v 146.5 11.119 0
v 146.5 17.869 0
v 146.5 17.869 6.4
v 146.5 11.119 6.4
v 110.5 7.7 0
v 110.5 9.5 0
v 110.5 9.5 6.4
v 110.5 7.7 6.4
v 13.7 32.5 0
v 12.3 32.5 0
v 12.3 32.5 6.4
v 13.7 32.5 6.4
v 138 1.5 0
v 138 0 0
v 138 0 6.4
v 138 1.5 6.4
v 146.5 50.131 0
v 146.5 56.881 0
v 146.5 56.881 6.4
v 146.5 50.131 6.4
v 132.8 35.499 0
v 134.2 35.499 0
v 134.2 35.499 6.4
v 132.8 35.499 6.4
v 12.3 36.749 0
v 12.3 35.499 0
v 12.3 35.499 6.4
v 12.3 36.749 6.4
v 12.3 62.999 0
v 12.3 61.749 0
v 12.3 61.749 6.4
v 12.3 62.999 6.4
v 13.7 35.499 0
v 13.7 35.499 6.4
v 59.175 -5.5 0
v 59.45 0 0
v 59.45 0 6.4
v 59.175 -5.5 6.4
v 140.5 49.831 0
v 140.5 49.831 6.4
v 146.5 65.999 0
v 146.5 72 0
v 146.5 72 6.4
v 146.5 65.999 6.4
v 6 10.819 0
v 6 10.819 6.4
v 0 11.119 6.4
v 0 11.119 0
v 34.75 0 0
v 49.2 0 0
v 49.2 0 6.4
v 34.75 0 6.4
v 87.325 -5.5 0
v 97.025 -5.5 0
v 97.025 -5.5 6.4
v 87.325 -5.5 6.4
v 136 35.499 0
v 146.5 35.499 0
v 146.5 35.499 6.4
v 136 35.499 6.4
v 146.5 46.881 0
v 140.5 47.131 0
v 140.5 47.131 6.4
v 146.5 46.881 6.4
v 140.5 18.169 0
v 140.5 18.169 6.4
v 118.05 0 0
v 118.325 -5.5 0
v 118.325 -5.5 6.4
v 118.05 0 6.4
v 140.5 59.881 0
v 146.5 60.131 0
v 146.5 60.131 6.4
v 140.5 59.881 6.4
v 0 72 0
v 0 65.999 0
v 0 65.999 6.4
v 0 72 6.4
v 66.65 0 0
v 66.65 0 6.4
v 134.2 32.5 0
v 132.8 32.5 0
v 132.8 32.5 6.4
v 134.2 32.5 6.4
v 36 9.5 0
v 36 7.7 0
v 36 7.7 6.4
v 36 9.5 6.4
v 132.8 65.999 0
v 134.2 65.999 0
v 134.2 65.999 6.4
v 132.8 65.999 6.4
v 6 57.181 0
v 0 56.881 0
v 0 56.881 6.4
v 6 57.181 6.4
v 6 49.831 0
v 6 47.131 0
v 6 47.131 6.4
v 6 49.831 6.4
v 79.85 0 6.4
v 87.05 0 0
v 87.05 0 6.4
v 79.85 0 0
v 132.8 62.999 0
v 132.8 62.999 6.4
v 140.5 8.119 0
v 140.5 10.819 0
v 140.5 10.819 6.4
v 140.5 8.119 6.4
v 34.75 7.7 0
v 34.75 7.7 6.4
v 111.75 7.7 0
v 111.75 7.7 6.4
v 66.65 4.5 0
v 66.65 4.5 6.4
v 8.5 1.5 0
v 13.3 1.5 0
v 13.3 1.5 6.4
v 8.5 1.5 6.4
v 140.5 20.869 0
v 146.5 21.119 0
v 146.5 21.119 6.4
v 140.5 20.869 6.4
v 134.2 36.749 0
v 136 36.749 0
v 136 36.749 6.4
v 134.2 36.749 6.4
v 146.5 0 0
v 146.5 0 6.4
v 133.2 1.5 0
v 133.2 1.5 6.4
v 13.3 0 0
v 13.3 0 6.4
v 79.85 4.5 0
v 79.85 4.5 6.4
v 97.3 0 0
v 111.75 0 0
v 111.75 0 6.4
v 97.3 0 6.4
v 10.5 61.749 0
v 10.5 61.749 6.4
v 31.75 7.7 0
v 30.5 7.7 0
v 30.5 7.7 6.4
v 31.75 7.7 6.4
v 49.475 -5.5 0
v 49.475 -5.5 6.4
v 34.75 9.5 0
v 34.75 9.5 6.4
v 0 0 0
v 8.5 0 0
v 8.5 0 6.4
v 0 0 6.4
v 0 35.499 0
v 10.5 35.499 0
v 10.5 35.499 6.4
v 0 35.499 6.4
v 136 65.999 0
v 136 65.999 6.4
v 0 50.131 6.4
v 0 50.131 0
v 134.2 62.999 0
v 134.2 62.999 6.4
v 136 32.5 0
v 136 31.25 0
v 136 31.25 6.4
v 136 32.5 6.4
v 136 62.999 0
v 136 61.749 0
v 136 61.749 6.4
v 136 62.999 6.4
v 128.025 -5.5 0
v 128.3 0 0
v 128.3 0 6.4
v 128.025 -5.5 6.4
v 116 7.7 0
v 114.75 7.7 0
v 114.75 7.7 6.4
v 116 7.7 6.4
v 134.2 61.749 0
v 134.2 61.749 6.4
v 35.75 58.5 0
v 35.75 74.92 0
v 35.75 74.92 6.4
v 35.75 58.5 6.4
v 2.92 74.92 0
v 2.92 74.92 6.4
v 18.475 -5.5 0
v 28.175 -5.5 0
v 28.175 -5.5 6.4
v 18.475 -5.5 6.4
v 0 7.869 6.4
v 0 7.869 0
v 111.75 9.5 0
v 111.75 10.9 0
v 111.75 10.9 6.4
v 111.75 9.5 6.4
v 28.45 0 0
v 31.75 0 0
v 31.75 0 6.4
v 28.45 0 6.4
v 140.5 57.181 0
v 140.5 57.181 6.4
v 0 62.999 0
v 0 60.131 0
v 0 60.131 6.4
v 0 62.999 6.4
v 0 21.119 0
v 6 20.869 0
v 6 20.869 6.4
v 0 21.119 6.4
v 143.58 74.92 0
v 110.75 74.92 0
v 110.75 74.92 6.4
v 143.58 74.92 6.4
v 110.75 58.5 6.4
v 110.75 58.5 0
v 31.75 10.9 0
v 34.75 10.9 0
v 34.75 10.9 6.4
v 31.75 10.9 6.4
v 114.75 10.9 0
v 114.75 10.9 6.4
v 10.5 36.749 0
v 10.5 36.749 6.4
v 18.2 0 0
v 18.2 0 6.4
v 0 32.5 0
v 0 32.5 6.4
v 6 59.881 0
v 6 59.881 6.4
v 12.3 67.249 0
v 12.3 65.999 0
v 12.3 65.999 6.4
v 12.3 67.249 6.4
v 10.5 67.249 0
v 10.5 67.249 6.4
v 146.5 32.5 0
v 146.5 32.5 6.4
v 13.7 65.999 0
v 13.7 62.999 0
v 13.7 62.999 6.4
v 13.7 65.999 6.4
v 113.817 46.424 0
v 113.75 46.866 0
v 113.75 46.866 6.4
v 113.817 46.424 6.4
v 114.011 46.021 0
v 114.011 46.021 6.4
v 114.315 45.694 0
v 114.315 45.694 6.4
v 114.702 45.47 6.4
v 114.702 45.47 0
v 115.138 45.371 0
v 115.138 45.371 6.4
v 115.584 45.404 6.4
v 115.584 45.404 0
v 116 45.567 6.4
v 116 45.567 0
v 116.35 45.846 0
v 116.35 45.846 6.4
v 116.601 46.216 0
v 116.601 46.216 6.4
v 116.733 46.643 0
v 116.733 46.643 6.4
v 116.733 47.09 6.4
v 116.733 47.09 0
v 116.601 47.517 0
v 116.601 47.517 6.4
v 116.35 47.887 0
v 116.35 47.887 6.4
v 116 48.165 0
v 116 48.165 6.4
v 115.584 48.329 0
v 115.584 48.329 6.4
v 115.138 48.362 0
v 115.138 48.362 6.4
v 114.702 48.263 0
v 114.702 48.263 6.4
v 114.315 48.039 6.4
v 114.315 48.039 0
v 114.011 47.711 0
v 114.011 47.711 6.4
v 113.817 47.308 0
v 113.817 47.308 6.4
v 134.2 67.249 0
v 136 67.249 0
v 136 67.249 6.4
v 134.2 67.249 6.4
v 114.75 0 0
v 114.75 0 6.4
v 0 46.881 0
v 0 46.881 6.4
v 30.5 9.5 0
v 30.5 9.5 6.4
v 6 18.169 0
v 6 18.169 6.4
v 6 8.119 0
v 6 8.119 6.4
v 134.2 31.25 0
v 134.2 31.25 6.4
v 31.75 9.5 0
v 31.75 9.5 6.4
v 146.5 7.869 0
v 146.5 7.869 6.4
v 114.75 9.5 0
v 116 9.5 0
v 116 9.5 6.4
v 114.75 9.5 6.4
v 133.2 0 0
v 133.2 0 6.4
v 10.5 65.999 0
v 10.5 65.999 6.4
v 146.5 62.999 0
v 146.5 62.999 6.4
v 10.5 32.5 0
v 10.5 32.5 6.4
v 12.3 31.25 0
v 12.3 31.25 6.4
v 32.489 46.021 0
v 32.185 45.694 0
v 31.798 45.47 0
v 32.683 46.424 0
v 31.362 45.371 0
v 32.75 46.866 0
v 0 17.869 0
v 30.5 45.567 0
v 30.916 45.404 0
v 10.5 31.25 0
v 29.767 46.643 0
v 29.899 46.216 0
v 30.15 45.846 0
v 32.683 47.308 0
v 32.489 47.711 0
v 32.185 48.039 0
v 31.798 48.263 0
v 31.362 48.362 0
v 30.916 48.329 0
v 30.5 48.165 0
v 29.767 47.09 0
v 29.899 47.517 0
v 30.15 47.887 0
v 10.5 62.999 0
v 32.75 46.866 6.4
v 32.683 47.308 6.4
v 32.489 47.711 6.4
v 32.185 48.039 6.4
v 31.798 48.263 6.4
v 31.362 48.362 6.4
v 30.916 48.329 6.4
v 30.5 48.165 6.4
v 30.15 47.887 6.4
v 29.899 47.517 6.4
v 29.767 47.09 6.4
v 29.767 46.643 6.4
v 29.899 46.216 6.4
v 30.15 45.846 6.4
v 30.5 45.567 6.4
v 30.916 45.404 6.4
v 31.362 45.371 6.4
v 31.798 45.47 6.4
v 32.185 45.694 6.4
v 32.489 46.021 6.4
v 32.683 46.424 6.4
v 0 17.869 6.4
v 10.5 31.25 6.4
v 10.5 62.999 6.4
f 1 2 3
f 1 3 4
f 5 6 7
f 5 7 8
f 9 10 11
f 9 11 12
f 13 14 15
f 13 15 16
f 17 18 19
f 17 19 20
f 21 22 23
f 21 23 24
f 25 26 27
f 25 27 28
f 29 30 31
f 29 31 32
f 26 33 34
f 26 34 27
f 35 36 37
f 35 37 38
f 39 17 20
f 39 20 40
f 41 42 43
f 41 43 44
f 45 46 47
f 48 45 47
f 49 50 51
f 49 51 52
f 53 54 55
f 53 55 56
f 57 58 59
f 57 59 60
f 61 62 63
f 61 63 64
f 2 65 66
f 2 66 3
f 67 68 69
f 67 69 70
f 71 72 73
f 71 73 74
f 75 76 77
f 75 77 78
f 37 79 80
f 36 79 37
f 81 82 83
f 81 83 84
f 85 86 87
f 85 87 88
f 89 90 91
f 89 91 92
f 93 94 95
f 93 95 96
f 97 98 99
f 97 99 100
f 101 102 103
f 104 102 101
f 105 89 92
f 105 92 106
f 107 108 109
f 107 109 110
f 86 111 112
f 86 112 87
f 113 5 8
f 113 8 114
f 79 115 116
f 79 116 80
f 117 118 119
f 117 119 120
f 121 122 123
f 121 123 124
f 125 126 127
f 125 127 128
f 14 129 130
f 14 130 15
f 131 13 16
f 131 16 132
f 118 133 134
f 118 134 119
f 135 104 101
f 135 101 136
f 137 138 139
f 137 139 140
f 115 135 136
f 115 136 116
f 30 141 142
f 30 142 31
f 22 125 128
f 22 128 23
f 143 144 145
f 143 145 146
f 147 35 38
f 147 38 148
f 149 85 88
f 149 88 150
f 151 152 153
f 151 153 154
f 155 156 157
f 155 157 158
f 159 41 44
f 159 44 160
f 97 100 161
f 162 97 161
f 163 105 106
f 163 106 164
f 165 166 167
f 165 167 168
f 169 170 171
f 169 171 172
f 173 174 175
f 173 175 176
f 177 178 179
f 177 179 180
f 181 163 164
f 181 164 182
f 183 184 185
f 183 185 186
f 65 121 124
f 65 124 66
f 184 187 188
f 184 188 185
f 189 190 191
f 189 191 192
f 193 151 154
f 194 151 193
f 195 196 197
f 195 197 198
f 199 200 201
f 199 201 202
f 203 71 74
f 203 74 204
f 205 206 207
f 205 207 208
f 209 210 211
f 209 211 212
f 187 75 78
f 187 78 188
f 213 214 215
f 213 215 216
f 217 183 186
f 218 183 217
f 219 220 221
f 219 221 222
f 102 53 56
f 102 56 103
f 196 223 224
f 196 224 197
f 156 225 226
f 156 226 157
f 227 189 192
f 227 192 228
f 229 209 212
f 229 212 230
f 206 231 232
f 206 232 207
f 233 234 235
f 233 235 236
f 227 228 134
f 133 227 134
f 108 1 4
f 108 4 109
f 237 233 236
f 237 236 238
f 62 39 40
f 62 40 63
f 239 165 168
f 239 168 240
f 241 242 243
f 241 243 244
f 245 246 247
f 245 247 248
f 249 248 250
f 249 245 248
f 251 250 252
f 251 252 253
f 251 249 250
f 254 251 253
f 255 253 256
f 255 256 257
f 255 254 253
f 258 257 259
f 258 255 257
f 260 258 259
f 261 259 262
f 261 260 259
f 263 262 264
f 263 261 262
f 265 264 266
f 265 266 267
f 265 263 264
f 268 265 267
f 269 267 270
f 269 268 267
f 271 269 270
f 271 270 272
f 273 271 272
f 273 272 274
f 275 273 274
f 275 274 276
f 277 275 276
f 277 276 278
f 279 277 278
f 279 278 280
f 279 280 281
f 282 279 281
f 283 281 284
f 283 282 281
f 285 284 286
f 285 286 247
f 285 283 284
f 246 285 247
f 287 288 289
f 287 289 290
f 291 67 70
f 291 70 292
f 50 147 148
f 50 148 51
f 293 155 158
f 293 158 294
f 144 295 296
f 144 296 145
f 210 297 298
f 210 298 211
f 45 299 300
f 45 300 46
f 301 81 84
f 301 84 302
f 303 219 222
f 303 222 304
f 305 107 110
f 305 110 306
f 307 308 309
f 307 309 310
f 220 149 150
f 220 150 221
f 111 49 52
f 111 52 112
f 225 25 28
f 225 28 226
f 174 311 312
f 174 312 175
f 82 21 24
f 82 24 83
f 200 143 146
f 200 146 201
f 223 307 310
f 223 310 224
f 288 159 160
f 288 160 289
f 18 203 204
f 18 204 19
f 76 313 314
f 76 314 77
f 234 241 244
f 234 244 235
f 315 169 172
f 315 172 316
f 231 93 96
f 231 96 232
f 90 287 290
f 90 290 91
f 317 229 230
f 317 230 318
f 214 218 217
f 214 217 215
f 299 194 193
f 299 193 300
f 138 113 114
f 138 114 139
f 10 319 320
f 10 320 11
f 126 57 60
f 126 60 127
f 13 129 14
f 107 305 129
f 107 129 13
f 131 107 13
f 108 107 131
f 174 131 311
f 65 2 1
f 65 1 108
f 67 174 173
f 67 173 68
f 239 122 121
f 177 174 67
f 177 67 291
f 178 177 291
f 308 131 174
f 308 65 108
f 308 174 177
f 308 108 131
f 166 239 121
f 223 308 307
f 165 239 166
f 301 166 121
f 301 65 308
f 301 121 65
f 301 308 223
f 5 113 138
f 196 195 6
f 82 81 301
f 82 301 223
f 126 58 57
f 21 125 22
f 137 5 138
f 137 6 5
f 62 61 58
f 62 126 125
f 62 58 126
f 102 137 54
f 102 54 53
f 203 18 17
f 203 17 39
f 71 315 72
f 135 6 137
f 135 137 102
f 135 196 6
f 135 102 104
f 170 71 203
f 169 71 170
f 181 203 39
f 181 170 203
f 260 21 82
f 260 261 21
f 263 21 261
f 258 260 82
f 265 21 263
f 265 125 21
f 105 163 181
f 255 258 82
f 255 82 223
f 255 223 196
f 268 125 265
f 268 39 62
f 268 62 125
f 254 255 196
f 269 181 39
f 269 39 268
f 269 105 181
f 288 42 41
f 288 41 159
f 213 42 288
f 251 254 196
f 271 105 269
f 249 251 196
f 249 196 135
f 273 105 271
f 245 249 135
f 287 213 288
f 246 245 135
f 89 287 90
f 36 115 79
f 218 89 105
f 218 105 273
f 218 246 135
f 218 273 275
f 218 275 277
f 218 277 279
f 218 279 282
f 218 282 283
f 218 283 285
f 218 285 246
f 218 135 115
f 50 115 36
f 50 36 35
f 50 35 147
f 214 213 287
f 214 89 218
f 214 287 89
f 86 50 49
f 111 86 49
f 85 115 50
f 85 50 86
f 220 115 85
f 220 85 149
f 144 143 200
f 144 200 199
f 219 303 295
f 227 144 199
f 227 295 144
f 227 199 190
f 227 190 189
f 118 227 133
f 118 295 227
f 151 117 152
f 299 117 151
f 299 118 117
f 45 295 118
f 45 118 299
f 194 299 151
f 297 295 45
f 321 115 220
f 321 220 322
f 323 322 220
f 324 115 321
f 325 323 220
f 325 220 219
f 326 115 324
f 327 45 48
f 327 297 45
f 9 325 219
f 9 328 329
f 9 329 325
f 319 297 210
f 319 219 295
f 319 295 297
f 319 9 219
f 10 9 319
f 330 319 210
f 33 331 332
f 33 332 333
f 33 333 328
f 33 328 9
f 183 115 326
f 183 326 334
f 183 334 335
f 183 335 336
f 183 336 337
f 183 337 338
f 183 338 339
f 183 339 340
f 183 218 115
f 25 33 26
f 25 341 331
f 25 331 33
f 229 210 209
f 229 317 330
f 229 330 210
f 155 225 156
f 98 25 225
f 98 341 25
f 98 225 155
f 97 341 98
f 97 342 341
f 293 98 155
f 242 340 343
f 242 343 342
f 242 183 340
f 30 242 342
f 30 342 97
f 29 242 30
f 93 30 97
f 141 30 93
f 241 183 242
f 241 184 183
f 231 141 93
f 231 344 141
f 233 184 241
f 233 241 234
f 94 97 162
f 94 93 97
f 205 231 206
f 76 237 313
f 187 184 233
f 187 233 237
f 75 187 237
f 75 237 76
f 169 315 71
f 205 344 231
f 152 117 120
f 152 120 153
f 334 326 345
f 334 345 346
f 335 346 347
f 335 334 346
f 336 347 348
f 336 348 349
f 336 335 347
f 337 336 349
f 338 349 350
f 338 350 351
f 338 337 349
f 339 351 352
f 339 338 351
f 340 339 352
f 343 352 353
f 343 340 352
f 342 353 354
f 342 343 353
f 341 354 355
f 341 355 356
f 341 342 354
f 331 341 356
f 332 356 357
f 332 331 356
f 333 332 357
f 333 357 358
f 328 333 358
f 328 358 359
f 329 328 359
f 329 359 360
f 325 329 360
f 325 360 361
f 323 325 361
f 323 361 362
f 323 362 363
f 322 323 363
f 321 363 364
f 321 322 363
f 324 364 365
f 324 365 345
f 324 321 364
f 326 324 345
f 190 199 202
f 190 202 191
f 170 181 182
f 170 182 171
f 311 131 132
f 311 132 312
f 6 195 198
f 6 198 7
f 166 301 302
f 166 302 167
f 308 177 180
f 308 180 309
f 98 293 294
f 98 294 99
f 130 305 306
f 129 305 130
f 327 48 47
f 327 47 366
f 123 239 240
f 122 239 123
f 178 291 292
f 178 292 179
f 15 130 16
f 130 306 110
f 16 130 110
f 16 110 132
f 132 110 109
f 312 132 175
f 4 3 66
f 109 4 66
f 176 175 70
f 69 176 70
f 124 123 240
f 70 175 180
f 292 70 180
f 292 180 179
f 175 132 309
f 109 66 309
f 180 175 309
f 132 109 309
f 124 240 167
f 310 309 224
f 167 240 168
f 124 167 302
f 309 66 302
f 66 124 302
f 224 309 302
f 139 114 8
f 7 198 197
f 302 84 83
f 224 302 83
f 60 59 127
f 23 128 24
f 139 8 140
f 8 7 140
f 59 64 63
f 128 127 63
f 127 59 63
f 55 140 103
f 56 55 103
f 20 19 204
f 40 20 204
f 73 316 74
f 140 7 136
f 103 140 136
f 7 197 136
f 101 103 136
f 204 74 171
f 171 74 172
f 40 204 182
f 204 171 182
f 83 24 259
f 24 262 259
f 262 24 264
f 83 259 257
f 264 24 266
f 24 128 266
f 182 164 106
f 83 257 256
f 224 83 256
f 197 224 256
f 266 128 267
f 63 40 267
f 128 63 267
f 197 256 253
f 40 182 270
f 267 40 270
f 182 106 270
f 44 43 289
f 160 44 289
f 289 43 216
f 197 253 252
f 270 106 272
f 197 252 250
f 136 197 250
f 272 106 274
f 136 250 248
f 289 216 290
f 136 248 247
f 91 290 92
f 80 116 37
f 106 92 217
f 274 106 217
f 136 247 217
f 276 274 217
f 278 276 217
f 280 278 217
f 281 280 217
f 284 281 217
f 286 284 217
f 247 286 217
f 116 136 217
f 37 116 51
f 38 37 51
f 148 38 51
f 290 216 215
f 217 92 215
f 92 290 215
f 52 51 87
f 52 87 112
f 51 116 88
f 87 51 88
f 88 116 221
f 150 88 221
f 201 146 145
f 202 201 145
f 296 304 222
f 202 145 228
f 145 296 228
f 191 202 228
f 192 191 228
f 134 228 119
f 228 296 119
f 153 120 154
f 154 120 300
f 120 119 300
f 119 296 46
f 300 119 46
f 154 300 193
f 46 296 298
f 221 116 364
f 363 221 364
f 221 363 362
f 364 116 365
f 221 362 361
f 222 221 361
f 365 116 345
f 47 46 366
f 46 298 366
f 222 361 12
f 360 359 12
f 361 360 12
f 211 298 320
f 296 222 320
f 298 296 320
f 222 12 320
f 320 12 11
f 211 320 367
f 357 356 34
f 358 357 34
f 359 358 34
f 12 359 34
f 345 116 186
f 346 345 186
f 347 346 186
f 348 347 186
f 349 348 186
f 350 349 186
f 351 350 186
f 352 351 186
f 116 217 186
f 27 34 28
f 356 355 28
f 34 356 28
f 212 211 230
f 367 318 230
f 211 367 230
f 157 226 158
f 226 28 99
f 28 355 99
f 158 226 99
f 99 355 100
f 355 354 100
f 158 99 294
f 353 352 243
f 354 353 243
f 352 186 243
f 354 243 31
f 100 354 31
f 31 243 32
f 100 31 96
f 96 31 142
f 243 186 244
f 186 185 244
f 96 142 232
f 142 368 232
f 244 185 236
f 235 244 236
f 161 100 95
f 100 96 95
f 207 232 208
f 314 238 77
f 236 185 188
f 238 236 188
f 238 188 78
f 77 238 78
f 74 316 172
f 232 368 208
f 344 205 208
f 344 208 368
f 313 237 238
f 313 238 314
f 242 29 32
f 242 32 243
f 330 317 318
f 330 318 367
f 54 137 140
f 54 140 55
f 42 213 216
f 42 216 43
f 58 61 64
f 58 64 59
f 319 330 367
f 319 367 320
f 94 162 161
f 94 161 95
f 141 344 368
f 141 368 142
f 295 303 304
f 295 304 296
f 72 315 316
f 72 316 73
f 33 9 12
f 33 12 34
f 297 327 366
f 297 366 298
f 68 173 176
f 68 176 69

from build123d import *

# Parameters (mm, degrees)
SKETCH2_R           = 1.5
BOSS_EXTRUDE1_DEPTH = 6.4


with BuildPart() as part:
    # Sketch2 → Boss-Extrude1 (new body)
    with BuildSketch(Plane.XY):
        Polygon((35.75, 58.5), (110.75, 58.5), (110.75, 74.92), (143.58, 74.92), (146.5, 72), (146.5, 65.999038761), (136, 65.999038761), (136, 67.249038761), (134.2, 67.249038761), (134.2, 65.999038761), (132.8, 65.999038761), (132.8, 62.999320414), (134.2, 62.999320414), (134.2, 61.749320414), (136, 61.749320414), (136, 62.999320414), (146.5, 62.999320414), (146.5, 60.13073157), (140.5, 59.88073157), (140.5, 57.18073157), (146.5, 56.88073157), (146.5, 50.13073157), (140.5, 49.83073157), (140.5, 47.13073157), (146.5, 46.88073157), (146.5, 35.499320414), (136, 35.499320414), (136, 36.749320414), (134.2, 36.749320414), (134.2, 35.499320414), (132.8, 35.499320414), (132.8, 32.499602067), (134.2, 32.499602067), (134.2, 31.249602067), (136, 31.249602067), (136, 32.499602067), (146.5, 32.499602067), (146.5, 21.11926843), (140.5, 20.86926843), (140.5, 18.16926843), (146.5, 17.86926843), (146.5, 11.11926843), (140.5, 10.81926843), (140.5, 8.11926843), (146.5, 7.86926843), (146.5, 0), (138, 0), (138, 1.5), (133.2, 1.5), (133.2, 0), (128.3, 0), (128.025, -5.5), (118.325, -5.5), (118.05, 0), (114.75, 0), (114.75, 7.7), (116, 7.7), (116, 9.5), (114.75, 9.5), (114.75, 10.9), (111.750281653, 10.9), (111.750281653, 9.5), (110.500281653, 9.5), (110.500281653, 7.7), (111.750281653, 7.7), (111.750281653, 0), (97.3, 0), (97.025, -5.5), (87.325, -5.5), (87.05, 0), (79.85, 0), (79.85, 4.5), (66.65, 4.5), (66.65, 0), (59.45, 0), (59.175, -5.5), (49.475, -5.5), (49.2, 0), (34.749718347, 0), (34.749718347, 7.7), (35.999718347, 7.7), (35.999718347, 9.5), (34.749718347, 9.5), (34.749718347, 10.9), (31.75, 10.9), (31.75, 9.5), (30.5, 9.5), (30.5, 7.7), (31.75, 7.7), (31.75, 0), (28.45, 0), (28.175, -5.5), (18.475, -5.5), (18.2, 0), (13.3, 0), (13.3, 1.5), (8.5, 1.5), (8.5, 0), (0, 0), (0, 7.86926843), (6, 8.11926843), (6, 10.81926843), (0, 11.11926843), (0, 17.86926843), (6, 18.16926843), (6, 20.86926843), (0, 21.11926843), (0, 32.499602067), (10.5, 32.499602067), (10.5, 31.249602067), (12.3, 31.249602067), (12.3, 32.499602067), (13.7, 32.499602067), (13.7, 35.499320414), (12.3, 35.499320414), (12.3, 36.749320414), (10.5, 36.749320414), (10.5, 35.499320414), (0, 35.499320414), (0, 46.88073157), (6, 47.13073157), (6, 49.83073157), (0, 50.13073157), (0, 56.88073157), (6, 57.18073157), (6, 59.88073157), (0, 60.13073157), (0, 62.999320414), (10.5, 62.999320414), (10.5, 61.749320414), (12.3, 61.749320414), (12.3, 62.999320414), (13.7, 62.999320414), (13.7, 65.999038761), (12.3, 65.999038761), (12.3, 67.249038761), (10.5, 67.249038761), (10.5, 65.999038761), (0, 65.999038761), (0, 72), (2.92, 74.92), (35.75, 74.92), align=None)
        with Locations((31.25, 46.866359173)):
            Circle(SKETCH2_R, mode=Mode.SUBTRACT)
        with Locations(Location((115.25, 46.866359173, 0), (0, 0, 180))):
            Circle(SKETCH2_R, mode=Mode.SUBTRACT)
    extrude(amount=BOSS_EXTRUDE1_DEPTH)


solid = part.part
